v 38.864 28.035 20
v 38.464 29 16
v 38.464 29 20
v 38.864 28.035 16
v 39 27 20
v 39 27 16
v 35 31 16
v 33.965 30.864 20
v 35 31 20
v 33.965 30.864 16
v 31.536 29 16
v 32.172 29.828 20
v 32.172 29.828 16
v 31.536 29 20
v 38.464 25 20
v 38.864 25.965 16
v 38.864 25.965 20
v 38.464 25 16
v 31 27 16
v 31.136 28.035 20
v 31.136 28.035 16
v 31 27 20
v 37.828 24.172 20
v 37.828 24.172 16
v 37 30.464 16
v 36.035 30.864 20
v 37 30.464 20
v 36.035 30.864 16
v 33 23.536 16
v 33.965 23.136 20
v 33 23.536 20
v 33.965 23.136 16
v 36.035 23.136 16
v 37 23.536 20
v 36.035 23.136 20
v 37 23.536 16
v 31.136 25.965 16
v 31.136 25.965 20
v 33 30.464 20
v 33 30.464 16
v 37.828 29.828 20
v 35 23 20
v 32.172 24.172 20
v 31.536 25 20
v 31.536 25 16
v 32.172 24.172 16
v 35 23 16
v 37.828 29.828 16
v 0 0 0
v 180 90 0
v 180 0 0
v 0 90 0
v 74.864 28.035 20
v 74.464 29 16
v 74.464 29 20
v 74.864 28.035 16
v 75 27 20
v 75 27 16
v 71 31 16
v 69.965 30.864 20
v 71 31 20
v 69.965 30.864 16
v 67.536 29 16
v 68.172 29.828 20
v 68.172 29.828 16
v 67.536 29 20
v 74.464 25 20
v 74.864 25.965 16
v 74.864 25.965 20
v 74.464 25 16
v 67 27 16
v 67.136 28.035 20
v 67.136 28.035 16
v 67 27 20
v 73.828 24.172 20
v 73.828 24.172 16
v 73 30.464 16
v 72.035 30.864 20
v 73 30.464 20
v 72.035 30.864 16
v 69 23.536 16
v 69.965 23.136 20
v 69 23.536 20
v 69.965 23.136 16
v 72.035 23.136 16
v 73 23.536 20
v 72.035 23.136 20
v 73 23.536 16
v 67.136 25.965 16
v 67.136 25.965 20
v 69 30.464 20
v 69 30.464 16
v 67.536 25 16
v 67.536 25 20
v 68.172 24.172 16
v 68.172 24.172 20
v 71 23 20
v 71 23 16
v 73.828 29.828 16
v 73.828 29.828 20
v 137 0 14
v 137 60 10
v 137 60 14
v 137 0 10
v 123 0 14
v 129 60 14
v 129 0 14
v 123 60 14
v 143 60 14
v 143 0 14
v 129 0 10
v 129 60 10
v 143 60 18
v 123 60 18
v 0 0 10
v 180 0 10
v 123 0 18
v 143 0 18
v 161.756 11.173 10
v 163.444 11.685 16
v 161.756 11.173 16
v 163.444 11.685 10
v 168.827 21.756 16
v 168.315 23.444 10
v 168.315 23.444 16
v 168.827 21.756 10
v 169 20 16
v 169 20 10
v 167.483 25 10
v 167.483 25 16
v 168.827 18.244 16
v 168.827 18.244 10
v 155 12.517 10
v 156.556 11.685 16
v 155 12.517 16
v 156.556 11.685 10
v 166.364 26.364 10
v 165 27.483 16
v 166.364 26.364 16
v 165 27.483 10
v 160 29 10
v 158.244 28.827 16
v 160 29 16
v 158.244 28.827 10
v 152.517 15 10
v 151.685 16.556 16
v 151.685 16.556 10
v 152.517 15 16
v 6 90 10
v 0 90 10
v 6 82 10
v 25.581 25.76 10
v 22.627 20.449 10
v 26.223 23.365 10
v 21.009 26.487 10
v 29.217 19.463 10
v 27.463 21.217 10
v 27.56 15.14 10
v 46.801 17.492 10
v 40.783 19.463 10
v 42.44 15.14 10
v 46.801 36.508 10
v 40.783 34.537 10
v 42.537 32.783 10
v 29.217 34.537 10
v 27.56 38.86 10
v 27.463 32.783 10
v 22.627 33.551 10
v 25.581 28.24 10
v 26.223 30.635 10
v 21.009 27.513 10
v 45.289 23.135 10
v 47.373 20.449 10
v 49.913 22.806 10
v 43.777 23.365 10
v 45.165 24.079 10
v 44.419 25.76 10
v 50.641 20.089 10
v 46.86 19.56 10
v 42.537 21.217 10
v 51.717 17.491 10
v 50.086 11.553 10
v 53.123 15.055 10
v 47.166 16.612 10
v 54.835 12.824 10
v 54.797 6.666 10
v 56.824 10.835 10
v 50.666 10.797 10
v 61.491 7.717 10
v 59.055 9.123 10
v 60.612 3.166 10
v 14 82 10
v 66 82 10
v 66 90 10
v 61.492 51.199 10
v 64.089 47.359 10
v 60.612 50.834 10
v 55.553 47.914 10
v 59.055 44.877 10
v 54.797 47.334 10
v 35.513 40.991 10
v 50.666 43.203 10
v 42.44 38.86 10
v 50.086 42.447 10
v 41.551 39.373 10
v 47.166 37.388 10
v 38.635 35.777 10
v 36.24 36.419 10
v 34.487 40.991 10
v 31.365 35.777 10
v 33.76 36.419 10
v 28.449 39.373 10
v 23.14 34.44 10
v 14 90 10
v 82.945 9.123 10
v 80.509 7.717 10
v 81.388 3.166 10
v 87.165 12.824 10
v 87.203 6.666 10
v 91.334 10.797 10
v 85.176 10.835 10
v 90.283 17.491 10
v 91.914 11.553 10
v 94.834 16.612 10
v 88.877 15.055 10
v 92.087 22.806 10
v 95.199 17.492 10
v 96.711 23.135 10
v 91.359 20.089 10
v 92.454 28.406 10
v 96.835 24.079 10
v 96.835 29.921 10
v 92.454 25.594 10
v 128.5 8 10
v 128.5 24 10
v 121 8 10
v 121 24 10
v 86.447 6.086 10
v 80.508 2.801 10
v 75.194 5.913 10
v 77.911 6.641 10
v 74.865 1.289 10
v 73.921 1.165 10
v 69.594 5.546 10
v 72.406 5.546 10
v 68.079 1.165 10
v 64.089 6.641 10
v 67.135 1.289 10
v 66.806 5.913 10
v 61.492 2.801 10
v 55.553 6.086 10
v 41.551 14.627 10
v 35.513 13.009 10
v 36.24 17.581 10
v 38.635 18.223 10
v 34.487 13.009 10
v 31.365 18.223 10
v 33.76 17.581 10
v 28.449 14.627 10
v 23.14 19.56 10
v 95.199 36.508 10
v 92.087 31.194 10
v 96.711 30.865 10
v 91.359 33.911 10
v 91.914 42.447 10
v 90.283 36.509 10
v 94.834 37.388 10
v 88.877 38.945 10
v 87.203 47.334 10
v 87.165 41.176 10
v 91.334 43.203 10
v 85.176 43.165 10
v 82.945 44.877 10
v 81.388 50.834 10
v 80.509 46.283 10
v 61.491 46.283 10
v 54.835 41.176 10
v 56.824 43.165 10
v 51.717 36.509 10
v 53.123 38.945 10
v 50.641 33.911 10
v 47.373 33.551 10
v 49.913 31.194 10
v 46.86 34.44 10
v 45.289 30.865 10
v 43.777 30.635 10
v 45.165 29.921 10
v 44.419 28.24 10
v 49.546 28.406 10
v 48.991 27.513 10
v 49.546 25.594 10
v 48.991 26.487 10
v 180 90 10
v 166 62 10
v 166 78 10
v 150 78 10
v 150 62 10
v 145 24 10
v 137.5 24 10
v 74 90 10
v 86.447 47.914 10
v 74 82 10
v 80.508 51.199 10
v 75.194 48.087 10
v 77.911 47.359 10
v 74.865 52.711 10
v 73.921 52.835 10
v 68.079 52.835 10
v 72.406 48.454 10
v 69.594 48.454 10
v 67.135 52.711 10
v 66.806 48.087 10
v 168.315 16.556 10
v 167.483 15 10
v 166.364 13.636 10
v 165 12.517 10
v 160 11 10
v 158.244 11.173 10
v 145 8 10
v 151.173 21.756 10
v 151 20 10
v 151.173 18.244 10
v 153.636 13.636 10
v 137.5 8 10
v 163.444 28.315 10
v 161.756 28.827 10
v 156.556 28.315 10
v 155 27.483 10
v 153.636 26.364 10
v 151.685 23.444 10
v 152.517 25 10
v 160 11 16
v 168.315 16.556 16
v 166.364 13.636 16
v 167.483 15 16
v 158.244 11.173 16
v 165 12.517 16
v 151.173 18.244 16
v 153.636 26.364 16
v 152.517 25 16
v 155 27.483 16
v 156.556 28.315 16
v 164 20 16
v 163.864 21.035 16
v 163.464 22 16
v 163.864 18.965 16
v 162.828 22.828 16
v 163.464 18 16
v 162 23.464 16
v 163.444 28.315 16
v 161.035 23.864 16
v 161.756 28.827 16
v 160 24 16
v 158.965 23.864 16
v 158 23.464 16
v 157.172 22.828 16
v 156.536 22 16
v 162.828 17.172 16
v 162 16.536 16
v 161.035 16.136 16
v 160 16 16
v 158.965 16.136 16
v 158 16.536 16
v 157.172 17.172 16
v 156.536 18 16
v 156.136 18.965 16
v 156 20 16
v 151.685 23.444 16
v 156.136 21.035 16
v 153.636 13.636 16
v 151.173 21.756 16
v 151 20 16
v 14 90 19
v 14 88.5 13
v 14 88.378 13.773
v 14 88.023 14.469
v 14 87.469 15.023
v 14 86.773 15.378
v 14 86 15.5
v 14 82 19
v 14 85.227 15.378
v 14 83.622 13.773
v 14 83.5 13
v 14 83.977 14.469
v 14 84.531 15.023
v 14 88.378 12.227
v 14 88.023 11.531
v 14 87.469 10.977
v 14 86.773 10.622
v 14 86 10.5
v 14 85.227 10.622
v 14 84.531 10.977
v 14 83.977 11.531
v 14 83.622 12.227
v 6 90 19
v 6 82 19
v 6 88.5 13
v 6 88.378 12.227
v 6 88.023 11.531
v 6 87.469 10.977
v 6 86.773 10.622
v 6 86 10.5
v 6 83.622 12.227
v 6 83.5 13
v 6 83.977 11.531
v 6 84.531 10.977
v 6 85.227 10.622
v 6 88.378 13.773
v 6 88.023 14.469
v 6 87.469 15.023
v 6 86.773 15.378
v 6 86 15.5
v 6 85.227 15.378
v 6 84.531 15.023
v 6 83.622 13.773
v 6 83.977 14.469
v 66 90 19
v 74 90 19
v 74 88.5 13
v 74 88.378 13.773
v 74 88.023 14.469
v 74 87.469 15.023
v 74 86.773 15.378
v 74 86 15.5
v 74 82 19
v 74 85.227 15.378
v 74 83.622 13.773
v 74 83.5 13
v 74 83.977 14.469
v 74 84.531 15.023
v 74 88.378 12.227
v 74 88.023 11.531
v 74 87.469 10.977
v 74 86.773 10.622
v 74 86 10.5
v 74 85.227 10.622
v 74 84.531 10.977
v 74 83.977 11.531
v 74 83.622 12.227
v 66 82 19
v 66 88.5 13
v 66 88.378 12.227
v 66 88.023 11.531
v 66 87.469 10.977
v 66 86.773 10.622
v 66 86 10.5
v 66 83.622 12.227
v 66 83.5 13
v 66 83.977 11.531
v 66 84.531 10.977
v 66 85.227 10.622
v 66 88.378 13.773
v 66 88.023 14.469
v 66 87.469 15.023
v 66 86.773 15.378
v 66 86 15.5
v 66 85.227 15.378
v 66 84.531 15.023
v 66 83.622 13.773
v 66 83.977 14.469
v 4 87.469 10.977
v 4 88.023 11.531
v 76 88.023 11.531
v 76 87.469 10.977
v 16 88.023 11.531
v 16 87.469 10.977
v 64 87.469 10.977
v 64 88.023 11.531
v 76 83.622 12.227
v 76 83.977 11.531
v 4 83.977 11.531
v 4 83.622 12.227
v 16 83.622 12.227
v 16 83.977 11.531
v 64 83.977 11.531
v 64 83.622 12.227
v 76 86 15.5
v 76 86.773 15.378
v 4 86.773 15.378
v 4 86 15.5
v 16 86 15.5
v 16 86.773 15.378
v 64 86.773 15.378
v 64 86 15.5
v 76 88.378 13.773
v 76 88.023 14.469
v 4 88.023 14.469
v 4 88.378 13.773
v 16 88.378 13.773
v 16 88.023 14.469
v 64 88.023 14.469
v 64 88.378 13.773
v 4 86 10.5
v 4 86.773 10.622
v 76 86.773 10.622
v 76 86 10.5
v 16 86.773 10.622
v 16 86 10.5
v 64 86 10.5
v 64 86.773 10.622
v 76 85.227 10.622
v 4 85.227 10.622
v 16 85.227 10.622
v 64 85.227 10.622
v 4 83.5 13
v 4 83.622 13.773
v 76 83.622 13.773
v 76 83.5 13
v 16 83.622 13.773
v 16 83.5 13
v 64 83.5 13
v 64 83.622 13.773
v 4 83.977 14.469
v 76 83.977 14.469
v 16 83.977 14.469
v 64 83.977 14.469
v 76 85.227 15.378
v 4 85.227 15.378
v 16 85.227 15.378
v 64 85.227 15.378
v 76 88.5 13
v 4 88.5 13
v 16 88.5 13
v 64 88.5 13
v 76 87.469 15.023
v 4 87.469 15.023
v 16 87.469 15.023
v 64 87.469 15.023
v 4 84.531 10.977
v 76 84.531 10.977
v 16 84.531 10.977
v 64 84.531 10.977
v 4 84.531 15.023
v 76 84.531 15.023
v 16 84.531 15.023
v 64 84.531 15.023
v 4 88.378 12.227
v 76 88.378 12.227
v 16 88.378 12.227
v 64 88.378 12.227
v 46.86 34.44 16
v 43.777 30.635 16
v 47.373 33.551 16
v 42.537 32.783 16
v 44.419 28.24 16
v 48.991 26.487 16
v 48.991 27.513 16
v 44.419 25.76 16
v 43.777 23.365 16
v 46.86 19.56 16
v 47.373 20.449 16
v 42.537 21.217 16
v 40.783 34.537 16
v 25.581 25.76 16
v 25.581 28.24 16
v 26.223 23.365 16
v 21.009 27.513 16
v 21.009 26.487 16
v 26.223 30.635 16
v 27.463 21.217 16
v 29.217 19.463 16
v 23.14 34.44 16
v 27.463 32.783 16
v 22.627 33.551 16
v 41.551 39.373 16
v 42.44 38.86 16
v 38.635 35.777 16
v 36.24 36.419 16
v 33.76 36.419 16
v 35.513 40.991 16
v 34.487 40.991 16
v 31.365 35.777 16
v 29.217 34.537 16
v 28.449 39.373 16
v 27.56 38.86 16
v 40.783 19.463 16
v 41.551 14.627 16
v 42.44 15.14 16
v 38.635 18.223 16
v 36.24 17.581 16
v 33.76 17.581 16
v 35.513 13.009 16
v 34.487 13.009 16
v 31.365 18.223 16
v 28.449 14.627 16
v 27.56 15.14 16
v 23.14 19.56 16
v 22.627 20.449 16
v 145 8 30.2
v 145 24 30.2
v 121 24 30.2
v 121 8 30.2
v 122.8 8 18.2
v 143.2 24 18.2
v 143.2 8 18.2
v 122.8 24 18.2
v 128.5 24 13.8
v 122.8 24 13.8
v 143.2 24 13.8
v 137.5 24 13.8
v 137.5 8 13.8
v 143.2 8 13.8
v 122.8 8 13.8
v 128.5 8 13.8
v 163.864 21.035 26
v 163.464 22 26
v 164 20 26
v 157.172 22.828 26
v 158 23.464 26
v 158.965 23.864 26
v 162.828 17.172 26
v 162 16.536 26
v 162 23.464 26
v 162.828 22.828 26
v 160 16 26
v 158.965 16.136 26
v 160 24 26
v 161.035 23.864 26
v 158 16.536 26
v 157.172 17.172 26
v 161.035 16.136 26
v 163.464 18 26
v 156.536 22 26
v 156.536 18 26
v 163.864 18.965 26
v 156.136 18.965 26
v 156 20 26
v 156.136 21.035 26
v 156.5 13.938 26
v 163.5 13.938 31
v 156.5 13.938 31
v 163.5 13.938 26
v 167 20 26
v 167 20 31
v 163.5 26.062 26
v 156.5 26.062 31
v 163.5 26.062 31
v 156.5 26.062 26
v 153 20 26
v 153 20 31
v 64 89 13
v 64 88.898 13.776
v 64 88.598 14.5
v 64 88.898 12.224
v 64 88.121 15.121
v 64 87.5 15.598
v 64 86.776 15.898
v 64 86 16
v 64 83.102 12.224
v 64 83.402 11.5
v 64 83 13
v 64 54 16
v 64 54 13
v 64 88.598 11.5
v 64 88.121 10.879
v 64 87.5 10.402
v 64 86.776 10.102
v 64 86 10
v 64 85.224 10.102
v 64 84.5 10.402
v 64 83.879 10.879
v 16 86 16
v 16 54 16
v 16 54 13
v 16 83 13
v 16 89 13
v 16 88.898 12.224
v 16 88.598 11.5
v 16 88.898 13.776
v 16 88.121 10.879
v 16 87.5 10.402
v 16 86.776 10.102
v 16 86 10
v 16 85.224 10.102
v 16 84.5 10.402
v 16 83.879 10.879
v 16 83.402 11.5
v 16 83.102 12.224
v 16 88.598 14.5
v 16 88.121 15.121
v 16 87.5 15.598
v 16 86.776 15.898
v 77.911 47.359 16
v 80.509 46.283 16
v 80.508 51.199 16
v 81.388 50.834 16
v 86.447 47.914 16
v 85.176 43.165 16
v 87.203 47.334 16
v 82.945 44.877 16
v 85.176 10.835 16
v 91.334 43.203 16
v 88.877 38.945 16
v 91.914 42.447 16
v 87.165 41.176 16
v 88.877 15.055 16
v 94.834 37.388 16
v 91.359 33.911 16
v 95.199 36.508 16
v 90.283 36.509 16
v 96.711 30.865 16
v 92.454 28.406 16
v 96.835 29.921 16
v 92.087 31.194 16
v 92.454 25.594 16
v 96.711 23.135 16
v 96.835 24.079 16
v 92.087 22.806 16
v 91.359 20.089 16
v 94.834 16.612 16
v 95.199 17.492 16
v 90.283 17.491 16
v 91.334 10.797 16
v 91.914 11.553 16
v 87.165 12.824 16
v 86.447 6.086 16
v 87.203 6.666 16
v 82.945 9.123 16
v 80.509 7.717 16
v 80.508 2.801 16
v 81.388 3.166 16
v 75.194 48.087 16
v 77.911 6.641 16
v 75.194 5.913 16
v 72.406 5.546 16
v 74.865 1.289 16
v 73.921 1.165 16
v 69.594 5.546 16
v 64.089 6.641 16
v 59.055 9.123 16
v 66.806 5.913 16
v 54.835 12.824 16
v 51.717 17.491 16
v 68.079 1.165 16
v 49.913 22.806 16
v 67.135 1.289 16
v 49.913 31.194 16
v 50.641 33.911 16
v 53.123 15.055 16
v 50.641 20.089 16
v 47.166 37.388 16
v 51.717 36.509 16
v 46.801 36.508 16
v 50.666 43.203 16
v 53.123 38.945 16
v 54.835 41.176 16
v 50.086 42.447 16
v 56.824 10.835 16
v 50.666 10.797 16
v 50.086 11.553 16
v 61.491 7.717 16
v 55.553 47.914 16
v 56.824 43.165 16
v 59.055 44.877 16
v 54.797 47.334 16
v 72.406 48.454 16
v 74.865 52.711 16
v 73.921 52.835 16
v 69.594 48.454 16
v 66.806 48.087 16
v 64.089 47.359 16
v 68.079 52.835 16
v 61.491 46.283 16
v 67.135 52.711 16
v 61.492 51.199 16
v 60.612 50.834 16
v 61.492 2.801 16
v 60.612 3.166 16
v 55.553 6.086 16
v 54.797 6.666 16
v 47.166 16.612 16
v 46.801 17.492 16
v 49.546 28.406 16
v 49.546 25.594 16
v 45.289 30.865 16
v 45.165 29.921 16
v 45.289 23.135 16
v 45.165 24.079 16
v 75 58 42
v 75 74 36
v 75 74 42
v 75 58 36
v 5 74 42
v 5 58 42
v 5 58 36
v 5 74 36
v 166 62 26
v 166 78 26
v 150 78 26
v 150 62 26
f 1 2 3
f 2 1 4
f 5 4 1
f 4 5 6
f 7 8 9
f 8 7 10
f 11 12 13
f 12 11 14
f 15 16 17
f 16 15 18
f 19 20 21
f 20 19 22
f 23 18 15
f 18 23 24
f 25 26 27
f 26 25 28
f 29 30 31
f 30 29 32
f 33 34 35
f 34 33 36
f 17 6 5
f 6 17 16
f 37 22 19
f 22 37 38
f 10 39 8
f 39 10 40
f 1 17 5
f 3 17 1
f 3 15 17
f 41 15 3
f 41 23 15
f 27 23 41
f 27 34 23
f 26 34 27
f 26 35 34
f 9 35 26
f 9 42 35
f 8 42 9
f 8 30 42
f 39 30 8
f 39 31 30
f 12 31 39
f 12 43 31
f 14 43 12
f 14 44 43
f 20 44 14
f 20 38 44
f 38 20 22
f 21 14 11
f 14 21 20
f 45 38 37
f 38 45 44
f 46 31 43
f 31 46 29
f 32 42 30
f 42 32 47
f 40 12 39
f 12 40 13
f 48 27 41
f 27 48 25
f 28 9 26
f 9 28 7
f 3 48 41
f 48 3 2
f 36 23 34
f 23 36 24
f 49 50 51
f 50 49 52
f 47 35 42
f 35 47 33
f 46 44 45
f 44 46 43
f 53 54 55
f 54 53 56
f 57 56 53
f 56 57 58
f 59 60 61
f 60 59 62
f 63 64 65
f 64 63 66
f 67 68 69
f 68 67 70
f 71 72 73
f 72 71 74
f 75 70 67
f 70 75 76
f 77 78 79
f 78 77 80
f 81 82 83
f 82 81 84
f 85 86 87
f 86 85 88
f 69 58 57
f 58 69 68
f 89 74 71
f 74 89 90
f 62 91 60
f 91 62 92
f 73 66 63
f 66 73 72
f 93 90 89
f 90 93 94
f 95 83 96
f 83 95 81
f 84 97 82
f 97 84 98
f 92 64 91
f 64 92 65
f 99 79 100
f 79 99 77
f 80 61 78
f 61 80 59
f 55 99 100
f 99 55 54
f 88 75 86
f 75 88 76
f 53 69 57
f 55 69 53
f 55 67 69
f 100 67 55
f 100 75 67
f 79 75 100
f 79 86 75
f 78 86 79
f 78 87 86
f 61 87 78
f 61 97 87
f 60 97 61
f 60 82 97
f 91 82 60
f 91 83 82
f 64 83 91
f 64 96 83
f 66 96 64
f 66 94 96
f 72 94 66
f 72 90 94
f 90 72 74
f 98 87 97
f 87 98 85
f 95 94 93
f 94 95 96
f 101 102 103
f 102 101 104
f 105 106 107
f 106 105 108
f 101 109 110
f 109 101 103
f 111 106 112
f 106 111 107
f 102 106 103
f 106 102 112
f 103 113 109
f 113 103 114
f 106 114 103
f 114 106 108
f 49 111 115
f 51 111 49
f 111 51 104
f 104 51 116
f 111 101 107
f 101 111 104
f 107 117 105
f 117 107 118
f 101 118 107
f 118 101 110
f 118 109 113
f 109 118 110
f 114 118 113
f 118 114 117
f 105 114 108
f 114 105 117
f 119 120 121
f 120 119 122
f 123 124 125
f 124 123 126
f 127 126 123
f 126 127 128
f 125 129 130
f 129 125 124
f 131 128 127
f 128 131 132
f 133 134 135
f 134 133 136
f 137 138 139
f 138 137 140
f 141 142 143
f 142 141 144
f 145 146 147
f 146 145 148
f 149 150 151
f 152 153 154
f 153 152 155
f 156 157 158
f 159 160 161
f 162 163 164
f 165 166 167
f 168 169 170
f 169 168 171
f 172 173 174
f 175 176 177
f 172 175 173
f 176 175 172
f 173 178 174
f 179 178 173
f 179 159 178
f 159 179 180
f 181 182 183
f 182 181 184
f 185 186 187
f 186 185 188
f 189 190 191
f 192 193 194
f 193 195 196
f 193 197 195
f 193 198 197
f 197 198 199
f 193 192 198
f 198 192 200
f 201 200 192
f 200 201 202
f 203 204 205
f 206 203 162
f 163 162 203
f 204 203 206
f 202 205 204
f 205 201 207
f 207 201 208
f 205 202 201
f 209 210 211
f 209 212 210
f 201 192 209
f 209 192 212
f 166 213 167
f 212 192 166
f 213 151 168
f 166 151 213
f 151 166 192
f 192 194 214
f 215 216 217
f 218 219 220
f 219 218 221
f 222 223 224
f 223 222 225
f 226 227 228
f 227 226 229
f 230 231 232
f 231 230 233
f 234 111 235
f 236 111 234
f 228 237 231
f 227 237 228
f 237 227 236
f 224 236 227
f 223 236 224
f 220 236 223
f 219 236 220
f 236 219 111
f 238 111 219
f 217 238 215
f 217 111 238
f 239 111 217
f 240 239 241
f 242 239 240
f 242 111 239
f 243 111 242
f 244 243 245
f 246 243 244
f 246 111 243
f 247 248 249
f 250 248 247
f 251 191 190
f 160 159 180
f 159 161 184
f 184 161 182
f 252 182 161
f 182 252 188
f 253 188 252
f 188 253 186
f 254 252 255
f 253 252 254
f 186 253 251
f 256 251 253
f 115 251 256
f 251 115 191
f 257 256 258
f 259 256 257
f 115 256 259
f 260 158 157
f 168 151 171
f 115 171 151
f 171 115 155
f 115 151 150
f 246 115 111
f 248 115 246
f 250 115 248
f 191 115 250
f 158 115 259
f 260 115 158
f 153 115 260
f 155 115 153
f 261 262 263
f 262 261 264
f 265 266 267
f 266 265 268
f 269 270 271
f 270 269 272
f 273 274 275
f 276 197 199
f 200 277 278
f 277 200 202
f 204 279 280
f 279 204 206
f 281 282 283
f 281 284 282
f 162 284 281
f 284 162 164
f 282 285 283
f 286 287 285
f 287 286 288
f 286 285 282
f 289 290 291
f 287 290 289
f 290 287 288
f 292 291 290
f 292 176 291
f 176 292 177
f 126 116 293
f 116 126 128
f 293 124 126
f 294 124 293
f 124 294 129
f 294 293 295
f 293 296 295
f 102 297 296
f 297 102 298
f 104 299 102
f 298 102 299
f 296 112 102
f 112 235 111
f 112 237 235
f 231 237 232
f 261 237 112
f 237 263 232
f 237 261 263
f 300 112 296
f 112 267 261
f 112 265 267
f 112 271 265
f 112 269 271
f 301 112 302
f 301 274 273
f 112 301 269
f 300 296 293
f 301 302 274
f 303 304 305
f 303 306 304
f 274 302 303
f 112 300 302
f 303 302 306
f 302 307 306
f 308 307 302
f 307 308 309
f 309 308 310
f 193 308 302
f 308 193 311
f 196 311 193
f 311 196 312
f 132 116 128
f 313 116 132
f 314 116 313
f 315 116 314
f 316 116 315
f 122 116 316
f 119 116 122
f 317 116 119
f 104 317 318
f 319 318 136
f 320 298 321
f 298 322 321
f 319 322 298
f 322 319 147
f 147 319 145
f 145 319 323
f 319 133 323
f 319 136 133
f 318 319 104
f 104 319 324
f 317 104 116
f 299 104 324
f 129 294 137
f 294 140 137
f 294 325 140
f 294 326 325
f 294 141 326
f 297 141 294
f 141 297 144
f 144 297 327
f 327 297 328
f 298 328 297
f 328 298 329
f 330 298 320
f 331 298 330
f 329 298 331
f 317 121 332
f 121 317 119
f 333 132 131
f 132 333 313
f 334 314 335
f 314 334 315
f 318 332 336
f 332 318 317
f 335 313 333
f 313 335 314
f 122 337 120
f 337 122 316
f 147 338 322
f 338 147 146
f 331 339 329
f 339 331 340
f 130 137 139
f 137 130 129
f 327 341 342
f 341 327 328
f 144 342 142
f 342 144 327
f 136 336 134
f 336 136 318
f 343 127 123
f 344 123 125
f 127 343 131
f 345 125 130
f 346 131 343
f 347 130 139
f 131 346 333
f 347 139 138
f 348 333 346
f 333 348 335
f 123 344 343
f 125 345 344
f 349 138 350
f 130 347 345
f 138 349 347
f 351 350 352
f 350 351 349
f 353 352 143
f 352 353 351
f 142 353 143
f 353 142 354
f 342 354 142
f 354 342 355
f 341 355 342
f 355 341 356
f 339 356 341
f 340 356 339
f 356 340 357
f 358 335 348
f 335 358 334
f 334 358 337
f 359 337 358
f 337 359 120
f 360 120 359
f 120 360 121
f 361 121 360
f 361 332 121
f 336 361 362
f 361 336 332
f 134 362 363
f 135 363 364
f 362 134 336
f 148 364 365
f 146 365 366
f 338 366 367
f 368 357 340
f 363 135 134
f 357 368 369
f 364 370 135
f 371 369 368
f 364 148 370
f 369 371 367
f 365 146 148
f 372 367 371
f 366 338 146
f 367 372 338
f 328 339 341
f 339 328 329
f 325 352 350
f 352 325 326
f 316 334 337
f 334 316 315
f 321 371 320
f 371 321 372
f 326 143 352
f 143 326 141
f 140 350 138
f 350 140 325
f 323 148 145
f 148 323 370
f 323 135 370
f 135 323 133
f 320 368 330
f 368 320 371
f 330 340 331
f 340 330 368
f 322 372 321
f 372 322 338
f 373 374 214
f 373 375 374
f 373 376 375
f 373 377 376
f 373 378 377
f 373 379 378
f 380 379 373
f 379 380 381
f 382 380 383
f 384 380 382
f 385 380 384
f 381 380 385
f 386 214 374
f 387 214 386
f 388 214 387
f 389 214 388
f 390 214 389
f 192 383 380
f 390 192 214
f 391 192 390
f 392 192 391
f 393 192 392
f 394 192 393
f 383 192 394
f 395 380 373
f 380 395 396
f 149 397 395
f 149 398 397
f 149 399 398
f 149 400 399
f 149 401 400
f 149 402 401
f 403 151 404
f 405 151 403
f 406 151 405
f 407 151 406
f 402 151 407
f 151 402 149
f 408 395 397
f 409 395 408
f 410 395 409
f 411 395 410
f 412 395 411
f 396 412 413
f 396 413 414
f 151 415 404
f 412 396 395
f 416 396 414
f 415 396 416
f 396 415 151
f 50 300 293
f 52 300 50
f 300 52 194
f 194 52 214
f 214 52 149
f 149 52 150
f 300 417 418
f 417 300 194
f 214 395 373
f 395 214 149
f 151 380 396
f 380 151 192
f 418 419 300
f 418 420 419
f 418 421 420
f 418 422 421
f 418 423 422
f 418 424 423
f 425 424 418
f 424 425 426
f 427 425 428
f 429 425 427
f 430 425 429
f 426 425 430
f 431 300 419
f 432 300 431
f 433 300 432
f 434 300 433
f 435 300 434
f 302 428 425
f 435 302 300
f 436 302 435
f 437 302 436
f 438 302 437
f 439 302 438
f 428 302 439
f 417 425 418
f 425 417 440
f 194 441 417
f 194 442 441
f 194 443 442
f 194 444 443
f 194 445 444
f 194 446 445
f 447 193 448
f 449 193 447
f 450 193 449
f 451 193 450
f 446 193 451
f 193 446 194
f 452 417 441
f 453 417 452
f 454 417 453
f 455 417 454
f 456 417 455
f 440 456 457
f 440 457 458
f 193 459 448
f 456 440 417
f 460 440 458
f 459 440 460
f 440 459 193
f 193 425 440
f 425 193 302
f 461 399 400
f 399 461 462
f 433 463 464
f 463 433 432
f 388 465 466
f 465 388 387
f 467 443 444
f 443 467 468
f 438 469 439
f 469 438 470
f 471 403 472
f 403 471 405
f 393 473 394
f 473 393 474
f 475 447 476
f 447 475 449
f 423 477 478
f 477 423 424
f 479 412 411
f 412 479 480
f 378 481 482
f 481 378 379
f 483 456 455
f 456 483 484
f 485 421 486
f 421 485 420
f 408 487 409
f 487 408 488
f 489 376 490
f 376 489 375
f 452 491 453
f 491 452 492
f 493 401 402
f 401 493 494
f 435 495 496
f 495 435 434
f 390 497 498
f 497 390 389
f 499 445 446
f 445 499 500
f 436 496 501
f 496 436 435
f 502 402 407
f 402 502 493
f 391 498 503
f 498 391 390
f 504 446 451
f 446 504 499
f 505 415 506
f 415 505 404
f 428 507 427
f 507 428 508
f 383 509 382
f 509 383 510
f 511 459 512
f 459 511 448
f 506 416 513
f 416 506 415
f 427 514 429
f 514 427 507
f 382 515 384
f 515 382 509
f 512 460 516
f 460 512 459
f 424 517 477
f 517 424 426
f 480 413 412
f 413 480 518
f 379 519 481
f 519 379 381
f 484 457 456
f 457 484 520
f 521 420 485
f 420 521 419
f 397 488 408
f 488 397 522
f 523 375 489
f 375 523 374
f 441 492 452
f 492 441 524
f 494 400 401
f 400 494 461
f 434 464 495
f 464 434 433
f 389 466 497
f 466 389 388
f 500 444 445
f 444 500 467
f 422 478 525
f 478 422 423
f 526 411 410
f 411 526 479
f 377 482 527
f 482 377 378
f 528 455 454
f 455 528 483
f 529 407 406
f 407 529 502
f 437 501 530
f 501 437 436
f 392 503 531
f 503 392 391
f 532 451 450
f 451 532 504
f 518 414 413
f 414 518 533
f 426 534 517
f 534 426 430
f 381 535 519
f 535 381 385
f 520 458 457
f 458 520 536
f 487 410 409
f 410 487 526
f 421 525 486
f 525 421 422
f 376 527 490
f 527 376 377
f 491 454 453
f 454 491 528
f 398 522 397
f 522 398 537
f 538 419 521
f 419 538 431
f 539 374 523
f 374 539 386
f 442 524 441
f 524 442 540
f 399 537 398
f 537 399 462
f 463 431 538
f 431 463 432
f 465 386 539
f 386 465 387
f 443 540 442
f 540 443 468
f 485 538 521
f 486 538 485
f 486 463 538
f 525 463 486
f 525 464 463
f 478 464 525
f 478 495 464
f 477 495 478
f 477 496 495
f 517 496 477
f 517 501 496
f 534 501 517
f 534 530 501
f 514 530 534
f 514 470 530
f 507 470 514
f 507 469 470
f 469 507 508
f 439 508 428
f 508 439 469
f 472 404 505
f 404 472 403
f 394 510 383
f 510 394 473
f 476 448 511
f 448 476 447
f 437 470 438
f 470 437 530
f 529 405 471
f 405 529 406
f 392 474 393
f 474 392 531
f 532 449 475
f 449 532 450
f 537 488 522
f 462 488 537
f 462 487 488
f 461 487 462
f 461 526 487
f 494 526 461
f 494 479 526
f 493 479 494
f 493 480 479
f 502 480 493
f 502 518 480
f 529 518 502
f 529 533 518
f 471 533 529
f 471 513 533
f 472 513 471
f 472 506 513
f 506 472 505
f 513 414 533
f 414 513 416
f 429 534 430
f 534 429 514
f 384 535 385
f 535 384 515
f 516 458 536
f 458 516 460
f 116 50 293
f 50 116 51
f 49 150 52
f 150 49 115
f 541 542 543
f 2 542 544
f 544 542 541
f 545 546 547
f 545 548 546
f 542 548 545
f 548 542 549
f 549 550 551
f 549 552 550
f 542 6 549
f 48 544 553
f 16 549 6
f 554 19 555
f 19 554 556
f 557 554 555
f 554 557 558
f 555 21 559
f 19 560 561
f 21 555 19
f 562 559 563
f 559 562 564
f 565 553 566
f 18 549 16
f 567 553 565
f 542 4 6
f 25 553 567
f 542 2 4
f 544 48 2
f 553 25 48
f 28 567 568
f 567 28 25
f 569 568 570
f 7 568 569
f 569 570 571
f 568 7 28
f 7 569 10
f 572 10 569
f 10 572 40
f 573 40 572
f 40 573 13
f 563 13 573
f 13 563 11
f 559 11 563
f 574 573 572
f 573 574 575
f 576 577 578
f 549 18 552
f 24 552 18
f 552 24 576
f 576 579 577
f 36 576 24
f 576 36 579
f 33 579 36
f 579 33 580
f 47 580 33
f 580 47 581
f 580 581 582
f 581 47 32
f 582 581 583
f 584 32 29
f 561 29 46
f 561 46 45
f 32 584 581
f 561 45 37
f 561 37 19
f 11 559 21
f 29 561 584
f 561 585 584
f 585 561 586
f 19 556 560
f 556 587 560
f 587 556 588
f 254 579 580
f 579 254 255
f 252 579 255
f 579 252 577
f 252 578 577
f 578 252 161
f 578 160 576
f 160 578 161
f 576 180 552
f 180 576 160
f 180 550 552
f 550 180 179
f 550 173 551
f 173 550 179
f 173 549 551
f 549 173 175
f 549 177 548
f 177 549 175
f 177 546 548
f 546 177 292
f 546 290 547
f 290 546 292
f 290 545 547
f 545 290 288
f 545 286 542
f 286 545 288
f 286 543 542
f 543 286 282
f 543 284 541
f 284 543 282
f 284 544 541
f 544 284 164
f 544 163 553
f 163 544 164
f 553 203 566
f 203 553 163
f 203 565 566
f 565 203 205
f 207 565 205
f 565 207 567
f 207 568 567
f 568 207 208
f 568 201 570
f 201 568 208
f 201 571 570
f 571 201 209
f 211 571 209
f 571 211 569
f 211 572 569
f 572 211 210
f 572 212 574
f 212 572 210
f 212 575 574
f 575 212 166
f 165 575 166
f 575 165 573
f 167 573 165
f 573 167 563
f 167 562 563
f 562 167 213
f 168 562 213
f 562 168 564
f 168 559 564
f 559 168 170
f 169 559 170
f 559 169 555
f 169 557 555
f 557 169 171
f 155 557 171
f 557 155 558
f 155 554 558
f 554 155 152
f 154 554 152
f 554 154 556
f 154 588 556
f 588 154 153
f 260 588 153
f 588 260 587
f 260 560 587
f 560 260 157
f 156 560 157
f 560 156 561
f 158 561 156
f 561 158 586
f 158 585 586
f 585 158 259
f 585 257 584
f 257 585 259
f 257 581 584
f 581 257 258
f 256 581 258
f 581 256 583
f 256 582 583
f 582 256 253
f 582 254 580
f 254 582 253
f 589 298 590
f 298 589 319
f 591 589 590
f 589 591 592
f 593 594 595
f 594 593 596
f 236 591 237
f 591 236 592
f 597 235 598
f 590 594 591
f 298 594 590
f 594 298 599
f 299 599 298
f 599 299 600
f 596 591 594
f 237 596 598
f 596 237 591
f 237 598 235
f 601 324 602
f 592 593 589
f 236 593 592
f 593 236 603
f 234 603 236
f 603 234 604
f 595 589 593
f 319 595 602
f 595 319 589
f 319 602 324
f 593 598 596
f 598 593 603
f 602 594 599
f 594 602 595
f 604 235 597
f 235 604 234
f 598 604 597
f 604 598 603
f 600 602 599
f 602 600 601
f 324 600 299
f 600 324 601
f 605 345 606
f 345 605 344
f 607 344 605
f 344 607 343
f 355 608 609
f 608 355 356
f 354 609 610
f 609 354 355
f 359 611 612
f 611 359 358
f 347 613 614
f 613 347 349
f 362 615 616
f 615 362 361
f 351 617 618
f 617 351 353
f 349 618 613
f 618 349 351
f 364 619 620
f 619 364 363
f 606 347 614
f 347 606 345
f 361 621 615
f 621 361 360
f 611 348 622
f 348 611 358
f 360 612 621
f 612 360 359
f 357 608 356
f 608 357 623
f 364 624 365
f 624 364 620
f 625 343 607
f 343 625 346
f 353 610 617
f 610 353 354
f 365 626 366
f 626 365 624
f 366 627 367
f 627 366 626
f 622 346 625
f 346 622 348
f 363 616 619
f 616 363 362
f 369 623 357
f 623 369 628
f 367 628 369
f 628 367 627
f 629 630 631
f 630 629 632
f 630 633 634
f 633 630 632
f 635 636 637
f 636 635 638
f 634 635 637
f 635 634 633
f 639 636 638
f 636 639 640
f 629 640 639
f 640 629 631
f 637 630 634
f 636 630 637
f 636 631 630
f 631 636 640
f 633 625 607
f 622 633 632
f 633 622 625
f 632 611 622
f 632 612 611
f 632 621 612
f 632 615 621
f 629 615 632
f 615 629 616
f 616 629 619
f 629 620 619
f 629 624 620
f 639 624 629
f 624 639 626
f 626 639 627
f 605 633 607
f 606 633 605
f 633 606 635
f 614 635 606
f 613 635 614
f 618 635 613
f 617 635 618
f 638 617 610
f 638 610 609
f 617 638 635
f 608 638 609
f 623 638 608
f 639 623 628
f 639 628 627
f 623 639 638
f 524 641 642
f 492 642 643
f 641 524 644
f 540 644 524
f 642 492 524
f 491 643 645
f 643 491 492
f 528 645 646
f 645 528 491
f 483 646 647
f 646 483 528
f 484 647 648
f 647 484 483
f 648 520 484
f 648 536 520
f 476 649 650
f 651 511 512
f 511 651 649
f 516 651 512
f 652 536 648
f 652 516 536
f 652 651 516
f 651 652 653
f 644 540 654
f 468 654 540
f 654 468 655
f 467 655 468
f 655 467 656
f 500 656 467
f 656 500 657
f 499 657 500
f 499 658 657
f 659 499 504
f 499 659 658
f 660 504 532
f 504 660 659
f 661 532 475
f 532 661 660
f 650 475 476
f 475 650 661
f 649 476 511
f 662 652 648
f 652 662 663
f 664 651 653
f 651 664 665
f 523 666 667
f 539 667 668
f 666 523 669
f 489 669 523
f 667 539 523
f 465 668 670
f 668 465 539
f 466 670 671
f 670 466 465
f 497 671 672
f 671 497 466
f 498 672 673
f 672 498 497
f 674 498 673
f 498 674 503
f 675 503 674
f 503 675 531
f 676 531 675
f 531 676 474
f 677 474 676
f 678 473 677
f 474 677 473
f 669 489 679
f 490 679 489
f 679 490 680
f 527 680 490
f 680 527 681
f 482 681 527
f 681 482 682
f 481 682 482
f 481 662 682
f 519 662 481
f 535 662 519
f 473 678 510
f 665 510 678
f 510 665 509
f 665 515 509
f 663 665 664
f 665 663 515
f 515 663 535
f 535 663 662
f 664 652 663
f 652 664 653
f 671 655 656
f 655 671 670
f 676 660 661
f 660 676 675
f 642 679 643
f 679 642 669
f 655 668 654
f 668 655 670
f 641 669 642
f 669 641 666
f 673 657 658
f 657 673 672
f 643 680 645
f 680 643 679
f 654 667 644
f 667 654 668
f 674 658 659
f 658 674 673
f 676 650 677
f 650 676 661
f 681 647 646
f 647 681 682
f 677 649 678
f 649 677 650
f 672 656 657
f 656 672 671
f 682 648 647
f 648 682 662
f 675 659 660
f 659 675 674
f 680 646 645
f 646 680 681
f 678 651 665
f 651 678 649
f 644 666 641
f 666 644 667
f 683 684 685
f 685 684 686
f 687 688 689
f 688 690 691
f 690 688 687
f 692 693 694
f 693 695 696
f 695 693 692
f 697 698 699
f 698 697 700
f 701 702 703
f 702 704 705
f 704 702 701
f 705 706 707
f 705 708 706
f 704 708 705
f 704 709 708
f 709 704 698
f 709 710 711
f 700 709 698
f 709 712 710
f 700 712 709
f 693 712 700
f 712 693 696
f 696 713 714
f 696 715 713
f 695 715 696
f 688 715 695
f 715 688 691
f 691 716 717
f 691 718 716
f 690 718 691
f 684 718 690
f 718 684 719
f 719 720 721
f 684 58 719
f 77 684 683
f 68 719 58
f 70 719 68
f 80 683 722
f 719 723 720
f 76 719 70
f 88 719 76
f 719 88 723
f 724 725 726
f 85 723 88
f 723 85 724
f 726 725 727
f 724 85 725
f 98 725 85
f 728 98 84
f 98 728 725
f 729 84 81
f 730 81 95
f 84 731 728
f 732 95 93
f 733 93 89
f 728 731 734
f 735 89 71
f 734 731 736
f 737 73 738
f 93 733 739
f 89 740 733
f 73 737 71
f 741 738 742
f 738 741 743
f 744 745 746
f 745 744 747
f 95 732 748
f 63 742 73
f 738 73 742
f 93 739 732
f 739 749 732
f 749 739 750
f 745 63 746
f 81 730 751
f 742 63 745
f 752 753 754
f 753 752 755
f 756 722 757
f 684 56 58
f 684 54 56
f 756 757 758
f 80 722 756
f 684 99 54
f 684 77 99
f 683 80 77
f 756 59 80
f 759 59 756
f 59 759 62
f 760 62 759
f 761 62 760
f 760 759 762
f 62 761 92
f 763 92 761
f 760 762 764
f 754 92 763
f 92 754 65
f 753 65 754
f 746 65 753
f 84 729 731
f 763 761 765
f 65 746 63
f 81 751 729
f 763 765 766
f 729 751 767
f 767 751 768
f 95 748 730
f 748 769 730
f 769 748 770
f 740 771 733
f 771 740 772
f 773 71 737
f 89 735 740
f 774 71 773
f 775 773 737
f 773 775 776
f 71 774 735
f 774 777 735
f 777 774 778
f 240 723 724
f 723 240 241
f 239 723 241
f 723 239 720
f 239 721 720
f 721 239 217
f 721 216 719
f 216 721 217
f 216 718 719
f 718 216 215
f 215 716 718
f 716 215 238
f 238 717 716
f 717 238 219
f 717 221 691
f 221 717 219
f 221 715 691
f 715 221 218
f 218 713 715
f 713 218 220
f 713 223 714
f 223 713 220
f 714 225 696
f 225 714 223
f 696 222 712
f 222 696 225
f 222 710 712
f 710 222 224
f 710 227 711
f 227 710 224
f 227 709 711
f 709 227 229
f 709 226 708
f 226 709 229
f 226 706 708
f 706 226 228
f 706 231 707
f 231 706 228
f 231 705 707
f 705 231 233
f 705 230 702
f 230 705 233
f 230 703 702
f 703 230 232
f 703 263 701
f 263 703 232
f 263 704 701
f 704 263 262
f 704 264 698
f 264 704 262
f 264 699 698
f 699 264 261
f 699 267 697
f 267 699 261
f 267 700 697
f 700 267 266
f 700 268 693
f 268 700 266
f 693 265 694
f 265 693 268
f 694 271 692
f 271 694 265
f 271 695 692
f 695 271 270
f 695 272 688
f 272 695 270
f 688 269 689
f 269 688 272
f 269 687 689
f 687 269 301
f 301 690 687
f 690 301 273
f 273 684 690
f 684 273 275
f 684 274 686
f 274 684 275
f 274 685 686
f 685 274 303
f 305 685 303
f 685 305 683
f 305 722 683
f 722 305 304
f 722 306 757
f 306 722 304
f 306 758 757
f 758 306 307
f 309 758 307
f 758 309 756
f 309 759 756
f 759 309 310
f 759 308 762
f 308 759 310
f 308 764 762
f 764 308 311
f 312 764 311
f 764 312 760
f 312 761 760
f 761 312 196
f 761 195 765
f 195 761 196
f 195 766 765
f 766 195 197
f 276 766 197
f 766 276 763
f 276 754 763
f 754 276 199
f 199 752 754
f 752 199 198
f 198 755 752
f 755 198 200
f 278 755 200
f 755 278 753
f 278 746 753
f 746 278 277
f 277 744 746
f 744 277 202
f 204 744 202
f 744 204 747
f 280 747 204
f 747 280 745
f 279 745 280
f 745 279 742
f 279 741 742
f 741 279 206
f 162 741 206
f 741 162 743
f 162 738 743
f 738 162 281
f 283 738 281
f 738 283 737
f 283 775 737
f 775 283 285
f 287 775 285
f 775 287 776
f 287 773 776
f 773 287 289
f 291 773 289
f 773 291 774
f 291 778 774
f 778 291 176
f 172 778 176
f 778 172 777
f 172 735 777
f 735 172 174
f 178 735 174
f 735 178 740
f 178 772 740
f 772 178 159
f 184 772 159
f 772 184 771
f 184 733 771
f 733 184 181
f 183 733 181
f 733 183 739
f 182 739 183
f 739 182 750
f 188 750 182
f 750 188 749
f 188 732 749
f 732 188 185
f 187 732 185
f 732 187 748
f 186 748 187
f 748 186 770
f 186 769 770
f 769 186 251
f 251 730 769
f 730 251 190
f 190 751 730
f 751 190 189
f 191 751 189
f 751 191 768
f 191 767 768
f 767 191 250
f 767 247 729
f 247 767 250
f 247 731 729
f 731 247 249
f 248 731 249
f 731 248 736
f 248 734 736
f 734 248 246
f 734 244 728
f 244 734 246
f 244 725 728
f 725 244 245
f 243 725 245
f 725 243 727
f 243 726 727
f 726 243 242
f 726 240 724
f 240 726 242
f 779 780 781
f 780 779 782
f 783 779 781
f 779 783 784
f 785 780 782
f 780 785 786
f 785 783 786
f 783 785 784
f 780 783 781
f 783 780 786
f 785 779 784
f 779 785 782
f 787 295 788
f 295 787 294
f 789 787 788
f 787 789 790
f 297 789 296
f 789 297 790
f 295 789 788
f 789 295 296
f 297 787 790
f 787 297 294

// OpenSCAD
// A small bench that exercises every kind of joint, drive and check.
//
//   cargo run -p threers-physics --features assembly,openscad --example mechanism_tour
//
// Drawn in millimetres, as CAD is. The shims below are what let OpenSCAD open
// this file: it has never heard of these modules and would otherwise drop each
// part() along with its children. threers overrides them with the real thing.
//
// Every joint here is *built* as well as declared, and that distinction is the
// one this bench exists to make. A mate is a sentence about two parts. It puts
// no pin in a bore, no rail under a carriage and no teeth on a gear, and it
// hides the omission twice over: the pair it names is excluded from the
// collision solver and from the interference check, because a real pin does live
// inside both halves of a real joint. So a shaft threaded on nothing, or a pair
// of gears 6 mm apart, simulates perfectly and reads perfectly. Only asking the
// geometry finds it — see the tour's `probe` example.

module part(name, fixed = false, density = undef) { children(); }
module hinge(name, parts, at, axis, range) { }
module slider(name, parts, at, axis, range) { }
module screw(name, parts, at, axis, pitch) { }
module gear(name, parts, at, axis, ratio) { }
module drive(name, to, over, at, torque, speed) { }

STEEL   = 0.0078;   // g/mm³
PLASTIC = 0.0012;
DECK    = 10;       // top of the bench

// ---- the gear pair, sized from its teeth ----------------------------------
// One module shared between them is what makes two gears a pair: it fixes each
// pitch radius at M·n/2, and so the centre distance at the sum of the two. The
// ratio is then the tooth counts and nothing else. Drawn the other way round —
// two plain discs at a spacing somebody liked, with a gear() mate asserting 2:1
// — the simulation is identical and the machine is a fiction.
M       = 2;
N_CRANK = 12;
N_WHEEL = 24;
function pitch_r(n) = M * n / 2;                 // 12 and 24
CENTRES = pitch_r(N_CRANK) + pitch_r(N_WHEEL);   // so, 36

CRANK = [35, 27, DECK];
WHEEL = [CRANK[0] + CENTRES, 27, DECK];

// One tooth is four points: out to the tip, across it, and back down to the
// root. Tooth centres land on multiples of the pitch angle, so an unphased gear
// has a tooth pointing along +x.
function gear_2d(n) =
    let (p = 360 / n, r = pitch_r(n), tip = r + M, root = r - 1.25 * M)
    [for (i = [0 : n - 1]) each [
        [root * cos((i - 0.25) * p), root * sin((i - 0.25) * p)],
        [tip  * cos((i - 0.07) * p), tip  * sin((i - 0.07) * p)],
        [tip  * cos((i + 0.07) * p), tip  * sin((i + 0.07) * p)],
        [root * cos((i + 0.25) * p), root * sin((i + 0.25) * p)],
    ]];

module wheel(n, h, phase = 0) {
    rotate([0, 0, phase]) linear_extrude(height = h) polygon(points = gear_2d(n));
}

BOLT  = [160, 20, DECK];
PIVOT = [10, 86, 13];      // the lid's hinge line
RAIL  = 133;               // the carriage rail's centreline in x

// ---------------------------------------------------------------- the bench
// The deck, and everything the moving parts actually run on: two shafts, a
// carriage rail, a boss for the bolt to thread into, and a pair of hinge lugs.
// None of it is decoration — each one is the thing its mate would otherwise be
// asserting into thin air.
part("base", fixed = true)
    color("slategray") {
        cube([180, 90, DECK]);

        color("dimgray") {
            // Shafts, each thinner than the root circle of the wheel on it.
            translate(CRANK) translate([0, 0, -DECK]) cylinder(h = 20, r = 4, $fn = 24);
            translate(WHEEL) translate([0, 0, -DECK]) cylinder(h = 20, r = 4, $fn = 24);

            // The carriage's rail: a stalk with a head, which the carriage hooks
            // under. A block set on a flat deck is held down by gravity and by
            // the slider mate, and by nothing you could machine.
            translate([RAIL - 4, 0, DECK - 1]) cube([8, 60, 5]);
            translate([RAIL - 10, 0, DECK + 4]) cube([20, 60, 4]);

            // A boss for the bolt to run into. A screw mate ties turning to
            // advancing; the thread it is named after has to be somewhere.
            translate(BOLT) cylinder(h = 6, r = 9, $fn = 32);

            // Two lugs for the lid's hinge, and the pin through them. The lid's
            // own knuckle goes between them.
            translate([6, 82, DECK]) cube([8, 8, 9]);
            translate([66, 82, DECK]) cube([8, 8, 9]);
            translate([4, PIVOT[1], PIVOT[2]]) rotate([0, 90, 0])
                cylinder(h = 72, r = 2.5, $fn = 20);
        }
    }

// ---- a crank that turns for as long as the run lasts ----------------------
// A shaft making full turns cannot be driven to a position: a hinge angle
// wraps at ±360°. `speed` is the tool for it.
part("crank", density = STEEL)
    color("indianred")
    translate(CRANK) {
        wheel(N_CRANK, 6);
        // A hub, inside the root circle so the collider is still the gear.
        color("firebrick") translate([-7, -3, 0]) cube([14, 6, 6]);
    }
hinge("crank_axle", parts = ["crank", "base"], at = CRANK, axis = [0, 0, 1]);
drive("crank_axle", speed = 120, torque = 40000);

// ---- geared to a wheel, 2:1 and counter-rotating --------------------------
// A gear constrains a *rate*, so both parts still need the hinges that hold
// them. Negative because external gears mesh the other way round.
//
// Phased so a tooth of one arrives at a gap of the other: the crank has a tooth
// pointing straight at the wheel, and the wheel — 24 teeth, so one every 15°,
// and 180 is a multiple of 15 — would meet it with a tooth of its own. Half a
// pitch round fixes that, and it is derived rather than dialled in.
PHASE = 180 / N_WHEEL;
part("wheel", density = STEEL)
    color("steelblue") translate(WHEEL) wheel(N_WHEEL, 6, PHASE);
hinge("wheel_axle", parts = ["wheel", "base"], at = WHEEL, axis = [0, 0, 1]);
gear("mesh", parts = ["crank", "wheel"],
     at = [CRANK[0] + pitch_r(N_CRANK), CRANK[1], DECK + 3], axis = [0, 0, 1],
     ratio = -N_WHEEL / N_CRANK);

// ---- a carriage on a rail, driven to a position --------------------------
// Drawn as what it is: a body over the rail, two walls down its sides and two
// hooks reaching in under the head. Over, under and either side of the head is
// five of the six freedoms gone, which is what a prismatic joint *is* — and it
// is the difference between a carriage and a brick.
part("carriage", density = PLASTIC)
    color("olivedrab") translate([0, 8, 0]) {
        translate([RAIL - 12, 0, DECK + 8.2]) cube([24, 16, 12]);   // body
        translate([RAIL - 12, 0, DECK - 0.2]) cube([1.8, 16, 8.4]); // near wall
        translate([RAIL + 10.2, 0, DECK - 0.2]) cube([1.8, 16, 8.4]);
        translate([RAIL - 12, 0, DECK - 0.2]) cube([7.5, 16, 4]);   // hooks
        translate([RAIL + 4.5, 0, DECK - 0.2]) cube([7.5, 16, 4]);
    }
slider("feed", parts = ["carriage", "base"],
       at = [RAIL, 8, DECK + 6], axis = [0, 1, 0], range = [0, 26]);
drive("feed", to = 26, over = 1.2, at = 0.4);

// ---- a bolt that turns itself into the deck -------------------------------
// One mate, not two: a thread holds the pair on an axis *and* ties turning to
// advancing, so driving its travel turns it. The head is what you watch: the
// shank is inside the boss, which is where a bolt's shank belongs.
part("bolt", density = STEEL)
    color("goldenrod")
    translate(BOLT) {
        cylinder(h = 20, r = 4, $fn = 24);
        translate([0, 0, 16]) cylinder(h = 5, r = 7, $fn = 6);
    }
screw("thread", parts = ["bolt", "base"], at = BOLT, axis = [0, 0, 1],
      pitch = 1.25, range = [-5, 0]);
// Degrees a second, as on any other rotation — a screw's *coordinate* is its
// travel, but what a motor on one drives is the shaft. 500°/s down a 1.25 mm
// lead is 1.7 mm a second, so it bottoms out about three seconds in.
//
// The torque has to *hold* the bolt as well as turn it, and a fine lead is an
// enormous mechanical advantage in both directions: 76,000 of bolt weight comes
// back to the shaft as 76,000 x 1.25 / 2pi = 15,000 of torque. A motor given
// 8,000 cannot brake its own bolt, and the thread runs away under it.
drive("thread", speed = 500, torque = 60000);

// ---- a lid that is asked for more than it can have ------------------------
// The axis points along −x so a positive angle *lifts* it. By the right-hand
// rule about +x the lid would swing down through the machinery instead, which
// the simulation would report as a stalled crank rather than as a mistake.
//
// Its knuckle runs between the base's two lugs, on the base's pin — three
// knuckles and a pin, which is a hinge. A flat plate laid on a deck with a
// hinge() naming its back edge is a plate laid on a deck.
part("lid", density = PLASTIC)
    color("sienna") {
        // Its front edge clear of the wheel's tooth tips, which reach y = 53:
        // drawn from 51, the shut lid lay on the gear, and lifted off it.
        translate([16, 54, 13]) cube([48, 32, 3]);
        translate([16, PIVOT[1], PIVOT[2]]) rotate([0, 90, 0])
            cylinder(h = 48, r = 3, $fn = 24);
    }
hinge("lid_pivot", parts = ["lid", "base"], at = PIVOT, axis = [-1, 0, 0], range = [0, 105]);
drive("lid_pivot", to = 105, over = 1.0, at = 0.6);

// The stop it will actually reach, well short of the 105 asked for.
part("stop", fixed = true)
    color("dimgray")
    translate([5, 58, 36]) cube([70, 16, 6]);

// ---- and one part attached to nothing at all ------------------------------
// Renders, has mass, interferes with nothing, and passes every overlap check
// ever written. Only a contact check across poses notices.
part("spare", density = PLASTIC)
    color("orchid")
    translate([150, 62, DECK]) cube([16, 16, 16]);
